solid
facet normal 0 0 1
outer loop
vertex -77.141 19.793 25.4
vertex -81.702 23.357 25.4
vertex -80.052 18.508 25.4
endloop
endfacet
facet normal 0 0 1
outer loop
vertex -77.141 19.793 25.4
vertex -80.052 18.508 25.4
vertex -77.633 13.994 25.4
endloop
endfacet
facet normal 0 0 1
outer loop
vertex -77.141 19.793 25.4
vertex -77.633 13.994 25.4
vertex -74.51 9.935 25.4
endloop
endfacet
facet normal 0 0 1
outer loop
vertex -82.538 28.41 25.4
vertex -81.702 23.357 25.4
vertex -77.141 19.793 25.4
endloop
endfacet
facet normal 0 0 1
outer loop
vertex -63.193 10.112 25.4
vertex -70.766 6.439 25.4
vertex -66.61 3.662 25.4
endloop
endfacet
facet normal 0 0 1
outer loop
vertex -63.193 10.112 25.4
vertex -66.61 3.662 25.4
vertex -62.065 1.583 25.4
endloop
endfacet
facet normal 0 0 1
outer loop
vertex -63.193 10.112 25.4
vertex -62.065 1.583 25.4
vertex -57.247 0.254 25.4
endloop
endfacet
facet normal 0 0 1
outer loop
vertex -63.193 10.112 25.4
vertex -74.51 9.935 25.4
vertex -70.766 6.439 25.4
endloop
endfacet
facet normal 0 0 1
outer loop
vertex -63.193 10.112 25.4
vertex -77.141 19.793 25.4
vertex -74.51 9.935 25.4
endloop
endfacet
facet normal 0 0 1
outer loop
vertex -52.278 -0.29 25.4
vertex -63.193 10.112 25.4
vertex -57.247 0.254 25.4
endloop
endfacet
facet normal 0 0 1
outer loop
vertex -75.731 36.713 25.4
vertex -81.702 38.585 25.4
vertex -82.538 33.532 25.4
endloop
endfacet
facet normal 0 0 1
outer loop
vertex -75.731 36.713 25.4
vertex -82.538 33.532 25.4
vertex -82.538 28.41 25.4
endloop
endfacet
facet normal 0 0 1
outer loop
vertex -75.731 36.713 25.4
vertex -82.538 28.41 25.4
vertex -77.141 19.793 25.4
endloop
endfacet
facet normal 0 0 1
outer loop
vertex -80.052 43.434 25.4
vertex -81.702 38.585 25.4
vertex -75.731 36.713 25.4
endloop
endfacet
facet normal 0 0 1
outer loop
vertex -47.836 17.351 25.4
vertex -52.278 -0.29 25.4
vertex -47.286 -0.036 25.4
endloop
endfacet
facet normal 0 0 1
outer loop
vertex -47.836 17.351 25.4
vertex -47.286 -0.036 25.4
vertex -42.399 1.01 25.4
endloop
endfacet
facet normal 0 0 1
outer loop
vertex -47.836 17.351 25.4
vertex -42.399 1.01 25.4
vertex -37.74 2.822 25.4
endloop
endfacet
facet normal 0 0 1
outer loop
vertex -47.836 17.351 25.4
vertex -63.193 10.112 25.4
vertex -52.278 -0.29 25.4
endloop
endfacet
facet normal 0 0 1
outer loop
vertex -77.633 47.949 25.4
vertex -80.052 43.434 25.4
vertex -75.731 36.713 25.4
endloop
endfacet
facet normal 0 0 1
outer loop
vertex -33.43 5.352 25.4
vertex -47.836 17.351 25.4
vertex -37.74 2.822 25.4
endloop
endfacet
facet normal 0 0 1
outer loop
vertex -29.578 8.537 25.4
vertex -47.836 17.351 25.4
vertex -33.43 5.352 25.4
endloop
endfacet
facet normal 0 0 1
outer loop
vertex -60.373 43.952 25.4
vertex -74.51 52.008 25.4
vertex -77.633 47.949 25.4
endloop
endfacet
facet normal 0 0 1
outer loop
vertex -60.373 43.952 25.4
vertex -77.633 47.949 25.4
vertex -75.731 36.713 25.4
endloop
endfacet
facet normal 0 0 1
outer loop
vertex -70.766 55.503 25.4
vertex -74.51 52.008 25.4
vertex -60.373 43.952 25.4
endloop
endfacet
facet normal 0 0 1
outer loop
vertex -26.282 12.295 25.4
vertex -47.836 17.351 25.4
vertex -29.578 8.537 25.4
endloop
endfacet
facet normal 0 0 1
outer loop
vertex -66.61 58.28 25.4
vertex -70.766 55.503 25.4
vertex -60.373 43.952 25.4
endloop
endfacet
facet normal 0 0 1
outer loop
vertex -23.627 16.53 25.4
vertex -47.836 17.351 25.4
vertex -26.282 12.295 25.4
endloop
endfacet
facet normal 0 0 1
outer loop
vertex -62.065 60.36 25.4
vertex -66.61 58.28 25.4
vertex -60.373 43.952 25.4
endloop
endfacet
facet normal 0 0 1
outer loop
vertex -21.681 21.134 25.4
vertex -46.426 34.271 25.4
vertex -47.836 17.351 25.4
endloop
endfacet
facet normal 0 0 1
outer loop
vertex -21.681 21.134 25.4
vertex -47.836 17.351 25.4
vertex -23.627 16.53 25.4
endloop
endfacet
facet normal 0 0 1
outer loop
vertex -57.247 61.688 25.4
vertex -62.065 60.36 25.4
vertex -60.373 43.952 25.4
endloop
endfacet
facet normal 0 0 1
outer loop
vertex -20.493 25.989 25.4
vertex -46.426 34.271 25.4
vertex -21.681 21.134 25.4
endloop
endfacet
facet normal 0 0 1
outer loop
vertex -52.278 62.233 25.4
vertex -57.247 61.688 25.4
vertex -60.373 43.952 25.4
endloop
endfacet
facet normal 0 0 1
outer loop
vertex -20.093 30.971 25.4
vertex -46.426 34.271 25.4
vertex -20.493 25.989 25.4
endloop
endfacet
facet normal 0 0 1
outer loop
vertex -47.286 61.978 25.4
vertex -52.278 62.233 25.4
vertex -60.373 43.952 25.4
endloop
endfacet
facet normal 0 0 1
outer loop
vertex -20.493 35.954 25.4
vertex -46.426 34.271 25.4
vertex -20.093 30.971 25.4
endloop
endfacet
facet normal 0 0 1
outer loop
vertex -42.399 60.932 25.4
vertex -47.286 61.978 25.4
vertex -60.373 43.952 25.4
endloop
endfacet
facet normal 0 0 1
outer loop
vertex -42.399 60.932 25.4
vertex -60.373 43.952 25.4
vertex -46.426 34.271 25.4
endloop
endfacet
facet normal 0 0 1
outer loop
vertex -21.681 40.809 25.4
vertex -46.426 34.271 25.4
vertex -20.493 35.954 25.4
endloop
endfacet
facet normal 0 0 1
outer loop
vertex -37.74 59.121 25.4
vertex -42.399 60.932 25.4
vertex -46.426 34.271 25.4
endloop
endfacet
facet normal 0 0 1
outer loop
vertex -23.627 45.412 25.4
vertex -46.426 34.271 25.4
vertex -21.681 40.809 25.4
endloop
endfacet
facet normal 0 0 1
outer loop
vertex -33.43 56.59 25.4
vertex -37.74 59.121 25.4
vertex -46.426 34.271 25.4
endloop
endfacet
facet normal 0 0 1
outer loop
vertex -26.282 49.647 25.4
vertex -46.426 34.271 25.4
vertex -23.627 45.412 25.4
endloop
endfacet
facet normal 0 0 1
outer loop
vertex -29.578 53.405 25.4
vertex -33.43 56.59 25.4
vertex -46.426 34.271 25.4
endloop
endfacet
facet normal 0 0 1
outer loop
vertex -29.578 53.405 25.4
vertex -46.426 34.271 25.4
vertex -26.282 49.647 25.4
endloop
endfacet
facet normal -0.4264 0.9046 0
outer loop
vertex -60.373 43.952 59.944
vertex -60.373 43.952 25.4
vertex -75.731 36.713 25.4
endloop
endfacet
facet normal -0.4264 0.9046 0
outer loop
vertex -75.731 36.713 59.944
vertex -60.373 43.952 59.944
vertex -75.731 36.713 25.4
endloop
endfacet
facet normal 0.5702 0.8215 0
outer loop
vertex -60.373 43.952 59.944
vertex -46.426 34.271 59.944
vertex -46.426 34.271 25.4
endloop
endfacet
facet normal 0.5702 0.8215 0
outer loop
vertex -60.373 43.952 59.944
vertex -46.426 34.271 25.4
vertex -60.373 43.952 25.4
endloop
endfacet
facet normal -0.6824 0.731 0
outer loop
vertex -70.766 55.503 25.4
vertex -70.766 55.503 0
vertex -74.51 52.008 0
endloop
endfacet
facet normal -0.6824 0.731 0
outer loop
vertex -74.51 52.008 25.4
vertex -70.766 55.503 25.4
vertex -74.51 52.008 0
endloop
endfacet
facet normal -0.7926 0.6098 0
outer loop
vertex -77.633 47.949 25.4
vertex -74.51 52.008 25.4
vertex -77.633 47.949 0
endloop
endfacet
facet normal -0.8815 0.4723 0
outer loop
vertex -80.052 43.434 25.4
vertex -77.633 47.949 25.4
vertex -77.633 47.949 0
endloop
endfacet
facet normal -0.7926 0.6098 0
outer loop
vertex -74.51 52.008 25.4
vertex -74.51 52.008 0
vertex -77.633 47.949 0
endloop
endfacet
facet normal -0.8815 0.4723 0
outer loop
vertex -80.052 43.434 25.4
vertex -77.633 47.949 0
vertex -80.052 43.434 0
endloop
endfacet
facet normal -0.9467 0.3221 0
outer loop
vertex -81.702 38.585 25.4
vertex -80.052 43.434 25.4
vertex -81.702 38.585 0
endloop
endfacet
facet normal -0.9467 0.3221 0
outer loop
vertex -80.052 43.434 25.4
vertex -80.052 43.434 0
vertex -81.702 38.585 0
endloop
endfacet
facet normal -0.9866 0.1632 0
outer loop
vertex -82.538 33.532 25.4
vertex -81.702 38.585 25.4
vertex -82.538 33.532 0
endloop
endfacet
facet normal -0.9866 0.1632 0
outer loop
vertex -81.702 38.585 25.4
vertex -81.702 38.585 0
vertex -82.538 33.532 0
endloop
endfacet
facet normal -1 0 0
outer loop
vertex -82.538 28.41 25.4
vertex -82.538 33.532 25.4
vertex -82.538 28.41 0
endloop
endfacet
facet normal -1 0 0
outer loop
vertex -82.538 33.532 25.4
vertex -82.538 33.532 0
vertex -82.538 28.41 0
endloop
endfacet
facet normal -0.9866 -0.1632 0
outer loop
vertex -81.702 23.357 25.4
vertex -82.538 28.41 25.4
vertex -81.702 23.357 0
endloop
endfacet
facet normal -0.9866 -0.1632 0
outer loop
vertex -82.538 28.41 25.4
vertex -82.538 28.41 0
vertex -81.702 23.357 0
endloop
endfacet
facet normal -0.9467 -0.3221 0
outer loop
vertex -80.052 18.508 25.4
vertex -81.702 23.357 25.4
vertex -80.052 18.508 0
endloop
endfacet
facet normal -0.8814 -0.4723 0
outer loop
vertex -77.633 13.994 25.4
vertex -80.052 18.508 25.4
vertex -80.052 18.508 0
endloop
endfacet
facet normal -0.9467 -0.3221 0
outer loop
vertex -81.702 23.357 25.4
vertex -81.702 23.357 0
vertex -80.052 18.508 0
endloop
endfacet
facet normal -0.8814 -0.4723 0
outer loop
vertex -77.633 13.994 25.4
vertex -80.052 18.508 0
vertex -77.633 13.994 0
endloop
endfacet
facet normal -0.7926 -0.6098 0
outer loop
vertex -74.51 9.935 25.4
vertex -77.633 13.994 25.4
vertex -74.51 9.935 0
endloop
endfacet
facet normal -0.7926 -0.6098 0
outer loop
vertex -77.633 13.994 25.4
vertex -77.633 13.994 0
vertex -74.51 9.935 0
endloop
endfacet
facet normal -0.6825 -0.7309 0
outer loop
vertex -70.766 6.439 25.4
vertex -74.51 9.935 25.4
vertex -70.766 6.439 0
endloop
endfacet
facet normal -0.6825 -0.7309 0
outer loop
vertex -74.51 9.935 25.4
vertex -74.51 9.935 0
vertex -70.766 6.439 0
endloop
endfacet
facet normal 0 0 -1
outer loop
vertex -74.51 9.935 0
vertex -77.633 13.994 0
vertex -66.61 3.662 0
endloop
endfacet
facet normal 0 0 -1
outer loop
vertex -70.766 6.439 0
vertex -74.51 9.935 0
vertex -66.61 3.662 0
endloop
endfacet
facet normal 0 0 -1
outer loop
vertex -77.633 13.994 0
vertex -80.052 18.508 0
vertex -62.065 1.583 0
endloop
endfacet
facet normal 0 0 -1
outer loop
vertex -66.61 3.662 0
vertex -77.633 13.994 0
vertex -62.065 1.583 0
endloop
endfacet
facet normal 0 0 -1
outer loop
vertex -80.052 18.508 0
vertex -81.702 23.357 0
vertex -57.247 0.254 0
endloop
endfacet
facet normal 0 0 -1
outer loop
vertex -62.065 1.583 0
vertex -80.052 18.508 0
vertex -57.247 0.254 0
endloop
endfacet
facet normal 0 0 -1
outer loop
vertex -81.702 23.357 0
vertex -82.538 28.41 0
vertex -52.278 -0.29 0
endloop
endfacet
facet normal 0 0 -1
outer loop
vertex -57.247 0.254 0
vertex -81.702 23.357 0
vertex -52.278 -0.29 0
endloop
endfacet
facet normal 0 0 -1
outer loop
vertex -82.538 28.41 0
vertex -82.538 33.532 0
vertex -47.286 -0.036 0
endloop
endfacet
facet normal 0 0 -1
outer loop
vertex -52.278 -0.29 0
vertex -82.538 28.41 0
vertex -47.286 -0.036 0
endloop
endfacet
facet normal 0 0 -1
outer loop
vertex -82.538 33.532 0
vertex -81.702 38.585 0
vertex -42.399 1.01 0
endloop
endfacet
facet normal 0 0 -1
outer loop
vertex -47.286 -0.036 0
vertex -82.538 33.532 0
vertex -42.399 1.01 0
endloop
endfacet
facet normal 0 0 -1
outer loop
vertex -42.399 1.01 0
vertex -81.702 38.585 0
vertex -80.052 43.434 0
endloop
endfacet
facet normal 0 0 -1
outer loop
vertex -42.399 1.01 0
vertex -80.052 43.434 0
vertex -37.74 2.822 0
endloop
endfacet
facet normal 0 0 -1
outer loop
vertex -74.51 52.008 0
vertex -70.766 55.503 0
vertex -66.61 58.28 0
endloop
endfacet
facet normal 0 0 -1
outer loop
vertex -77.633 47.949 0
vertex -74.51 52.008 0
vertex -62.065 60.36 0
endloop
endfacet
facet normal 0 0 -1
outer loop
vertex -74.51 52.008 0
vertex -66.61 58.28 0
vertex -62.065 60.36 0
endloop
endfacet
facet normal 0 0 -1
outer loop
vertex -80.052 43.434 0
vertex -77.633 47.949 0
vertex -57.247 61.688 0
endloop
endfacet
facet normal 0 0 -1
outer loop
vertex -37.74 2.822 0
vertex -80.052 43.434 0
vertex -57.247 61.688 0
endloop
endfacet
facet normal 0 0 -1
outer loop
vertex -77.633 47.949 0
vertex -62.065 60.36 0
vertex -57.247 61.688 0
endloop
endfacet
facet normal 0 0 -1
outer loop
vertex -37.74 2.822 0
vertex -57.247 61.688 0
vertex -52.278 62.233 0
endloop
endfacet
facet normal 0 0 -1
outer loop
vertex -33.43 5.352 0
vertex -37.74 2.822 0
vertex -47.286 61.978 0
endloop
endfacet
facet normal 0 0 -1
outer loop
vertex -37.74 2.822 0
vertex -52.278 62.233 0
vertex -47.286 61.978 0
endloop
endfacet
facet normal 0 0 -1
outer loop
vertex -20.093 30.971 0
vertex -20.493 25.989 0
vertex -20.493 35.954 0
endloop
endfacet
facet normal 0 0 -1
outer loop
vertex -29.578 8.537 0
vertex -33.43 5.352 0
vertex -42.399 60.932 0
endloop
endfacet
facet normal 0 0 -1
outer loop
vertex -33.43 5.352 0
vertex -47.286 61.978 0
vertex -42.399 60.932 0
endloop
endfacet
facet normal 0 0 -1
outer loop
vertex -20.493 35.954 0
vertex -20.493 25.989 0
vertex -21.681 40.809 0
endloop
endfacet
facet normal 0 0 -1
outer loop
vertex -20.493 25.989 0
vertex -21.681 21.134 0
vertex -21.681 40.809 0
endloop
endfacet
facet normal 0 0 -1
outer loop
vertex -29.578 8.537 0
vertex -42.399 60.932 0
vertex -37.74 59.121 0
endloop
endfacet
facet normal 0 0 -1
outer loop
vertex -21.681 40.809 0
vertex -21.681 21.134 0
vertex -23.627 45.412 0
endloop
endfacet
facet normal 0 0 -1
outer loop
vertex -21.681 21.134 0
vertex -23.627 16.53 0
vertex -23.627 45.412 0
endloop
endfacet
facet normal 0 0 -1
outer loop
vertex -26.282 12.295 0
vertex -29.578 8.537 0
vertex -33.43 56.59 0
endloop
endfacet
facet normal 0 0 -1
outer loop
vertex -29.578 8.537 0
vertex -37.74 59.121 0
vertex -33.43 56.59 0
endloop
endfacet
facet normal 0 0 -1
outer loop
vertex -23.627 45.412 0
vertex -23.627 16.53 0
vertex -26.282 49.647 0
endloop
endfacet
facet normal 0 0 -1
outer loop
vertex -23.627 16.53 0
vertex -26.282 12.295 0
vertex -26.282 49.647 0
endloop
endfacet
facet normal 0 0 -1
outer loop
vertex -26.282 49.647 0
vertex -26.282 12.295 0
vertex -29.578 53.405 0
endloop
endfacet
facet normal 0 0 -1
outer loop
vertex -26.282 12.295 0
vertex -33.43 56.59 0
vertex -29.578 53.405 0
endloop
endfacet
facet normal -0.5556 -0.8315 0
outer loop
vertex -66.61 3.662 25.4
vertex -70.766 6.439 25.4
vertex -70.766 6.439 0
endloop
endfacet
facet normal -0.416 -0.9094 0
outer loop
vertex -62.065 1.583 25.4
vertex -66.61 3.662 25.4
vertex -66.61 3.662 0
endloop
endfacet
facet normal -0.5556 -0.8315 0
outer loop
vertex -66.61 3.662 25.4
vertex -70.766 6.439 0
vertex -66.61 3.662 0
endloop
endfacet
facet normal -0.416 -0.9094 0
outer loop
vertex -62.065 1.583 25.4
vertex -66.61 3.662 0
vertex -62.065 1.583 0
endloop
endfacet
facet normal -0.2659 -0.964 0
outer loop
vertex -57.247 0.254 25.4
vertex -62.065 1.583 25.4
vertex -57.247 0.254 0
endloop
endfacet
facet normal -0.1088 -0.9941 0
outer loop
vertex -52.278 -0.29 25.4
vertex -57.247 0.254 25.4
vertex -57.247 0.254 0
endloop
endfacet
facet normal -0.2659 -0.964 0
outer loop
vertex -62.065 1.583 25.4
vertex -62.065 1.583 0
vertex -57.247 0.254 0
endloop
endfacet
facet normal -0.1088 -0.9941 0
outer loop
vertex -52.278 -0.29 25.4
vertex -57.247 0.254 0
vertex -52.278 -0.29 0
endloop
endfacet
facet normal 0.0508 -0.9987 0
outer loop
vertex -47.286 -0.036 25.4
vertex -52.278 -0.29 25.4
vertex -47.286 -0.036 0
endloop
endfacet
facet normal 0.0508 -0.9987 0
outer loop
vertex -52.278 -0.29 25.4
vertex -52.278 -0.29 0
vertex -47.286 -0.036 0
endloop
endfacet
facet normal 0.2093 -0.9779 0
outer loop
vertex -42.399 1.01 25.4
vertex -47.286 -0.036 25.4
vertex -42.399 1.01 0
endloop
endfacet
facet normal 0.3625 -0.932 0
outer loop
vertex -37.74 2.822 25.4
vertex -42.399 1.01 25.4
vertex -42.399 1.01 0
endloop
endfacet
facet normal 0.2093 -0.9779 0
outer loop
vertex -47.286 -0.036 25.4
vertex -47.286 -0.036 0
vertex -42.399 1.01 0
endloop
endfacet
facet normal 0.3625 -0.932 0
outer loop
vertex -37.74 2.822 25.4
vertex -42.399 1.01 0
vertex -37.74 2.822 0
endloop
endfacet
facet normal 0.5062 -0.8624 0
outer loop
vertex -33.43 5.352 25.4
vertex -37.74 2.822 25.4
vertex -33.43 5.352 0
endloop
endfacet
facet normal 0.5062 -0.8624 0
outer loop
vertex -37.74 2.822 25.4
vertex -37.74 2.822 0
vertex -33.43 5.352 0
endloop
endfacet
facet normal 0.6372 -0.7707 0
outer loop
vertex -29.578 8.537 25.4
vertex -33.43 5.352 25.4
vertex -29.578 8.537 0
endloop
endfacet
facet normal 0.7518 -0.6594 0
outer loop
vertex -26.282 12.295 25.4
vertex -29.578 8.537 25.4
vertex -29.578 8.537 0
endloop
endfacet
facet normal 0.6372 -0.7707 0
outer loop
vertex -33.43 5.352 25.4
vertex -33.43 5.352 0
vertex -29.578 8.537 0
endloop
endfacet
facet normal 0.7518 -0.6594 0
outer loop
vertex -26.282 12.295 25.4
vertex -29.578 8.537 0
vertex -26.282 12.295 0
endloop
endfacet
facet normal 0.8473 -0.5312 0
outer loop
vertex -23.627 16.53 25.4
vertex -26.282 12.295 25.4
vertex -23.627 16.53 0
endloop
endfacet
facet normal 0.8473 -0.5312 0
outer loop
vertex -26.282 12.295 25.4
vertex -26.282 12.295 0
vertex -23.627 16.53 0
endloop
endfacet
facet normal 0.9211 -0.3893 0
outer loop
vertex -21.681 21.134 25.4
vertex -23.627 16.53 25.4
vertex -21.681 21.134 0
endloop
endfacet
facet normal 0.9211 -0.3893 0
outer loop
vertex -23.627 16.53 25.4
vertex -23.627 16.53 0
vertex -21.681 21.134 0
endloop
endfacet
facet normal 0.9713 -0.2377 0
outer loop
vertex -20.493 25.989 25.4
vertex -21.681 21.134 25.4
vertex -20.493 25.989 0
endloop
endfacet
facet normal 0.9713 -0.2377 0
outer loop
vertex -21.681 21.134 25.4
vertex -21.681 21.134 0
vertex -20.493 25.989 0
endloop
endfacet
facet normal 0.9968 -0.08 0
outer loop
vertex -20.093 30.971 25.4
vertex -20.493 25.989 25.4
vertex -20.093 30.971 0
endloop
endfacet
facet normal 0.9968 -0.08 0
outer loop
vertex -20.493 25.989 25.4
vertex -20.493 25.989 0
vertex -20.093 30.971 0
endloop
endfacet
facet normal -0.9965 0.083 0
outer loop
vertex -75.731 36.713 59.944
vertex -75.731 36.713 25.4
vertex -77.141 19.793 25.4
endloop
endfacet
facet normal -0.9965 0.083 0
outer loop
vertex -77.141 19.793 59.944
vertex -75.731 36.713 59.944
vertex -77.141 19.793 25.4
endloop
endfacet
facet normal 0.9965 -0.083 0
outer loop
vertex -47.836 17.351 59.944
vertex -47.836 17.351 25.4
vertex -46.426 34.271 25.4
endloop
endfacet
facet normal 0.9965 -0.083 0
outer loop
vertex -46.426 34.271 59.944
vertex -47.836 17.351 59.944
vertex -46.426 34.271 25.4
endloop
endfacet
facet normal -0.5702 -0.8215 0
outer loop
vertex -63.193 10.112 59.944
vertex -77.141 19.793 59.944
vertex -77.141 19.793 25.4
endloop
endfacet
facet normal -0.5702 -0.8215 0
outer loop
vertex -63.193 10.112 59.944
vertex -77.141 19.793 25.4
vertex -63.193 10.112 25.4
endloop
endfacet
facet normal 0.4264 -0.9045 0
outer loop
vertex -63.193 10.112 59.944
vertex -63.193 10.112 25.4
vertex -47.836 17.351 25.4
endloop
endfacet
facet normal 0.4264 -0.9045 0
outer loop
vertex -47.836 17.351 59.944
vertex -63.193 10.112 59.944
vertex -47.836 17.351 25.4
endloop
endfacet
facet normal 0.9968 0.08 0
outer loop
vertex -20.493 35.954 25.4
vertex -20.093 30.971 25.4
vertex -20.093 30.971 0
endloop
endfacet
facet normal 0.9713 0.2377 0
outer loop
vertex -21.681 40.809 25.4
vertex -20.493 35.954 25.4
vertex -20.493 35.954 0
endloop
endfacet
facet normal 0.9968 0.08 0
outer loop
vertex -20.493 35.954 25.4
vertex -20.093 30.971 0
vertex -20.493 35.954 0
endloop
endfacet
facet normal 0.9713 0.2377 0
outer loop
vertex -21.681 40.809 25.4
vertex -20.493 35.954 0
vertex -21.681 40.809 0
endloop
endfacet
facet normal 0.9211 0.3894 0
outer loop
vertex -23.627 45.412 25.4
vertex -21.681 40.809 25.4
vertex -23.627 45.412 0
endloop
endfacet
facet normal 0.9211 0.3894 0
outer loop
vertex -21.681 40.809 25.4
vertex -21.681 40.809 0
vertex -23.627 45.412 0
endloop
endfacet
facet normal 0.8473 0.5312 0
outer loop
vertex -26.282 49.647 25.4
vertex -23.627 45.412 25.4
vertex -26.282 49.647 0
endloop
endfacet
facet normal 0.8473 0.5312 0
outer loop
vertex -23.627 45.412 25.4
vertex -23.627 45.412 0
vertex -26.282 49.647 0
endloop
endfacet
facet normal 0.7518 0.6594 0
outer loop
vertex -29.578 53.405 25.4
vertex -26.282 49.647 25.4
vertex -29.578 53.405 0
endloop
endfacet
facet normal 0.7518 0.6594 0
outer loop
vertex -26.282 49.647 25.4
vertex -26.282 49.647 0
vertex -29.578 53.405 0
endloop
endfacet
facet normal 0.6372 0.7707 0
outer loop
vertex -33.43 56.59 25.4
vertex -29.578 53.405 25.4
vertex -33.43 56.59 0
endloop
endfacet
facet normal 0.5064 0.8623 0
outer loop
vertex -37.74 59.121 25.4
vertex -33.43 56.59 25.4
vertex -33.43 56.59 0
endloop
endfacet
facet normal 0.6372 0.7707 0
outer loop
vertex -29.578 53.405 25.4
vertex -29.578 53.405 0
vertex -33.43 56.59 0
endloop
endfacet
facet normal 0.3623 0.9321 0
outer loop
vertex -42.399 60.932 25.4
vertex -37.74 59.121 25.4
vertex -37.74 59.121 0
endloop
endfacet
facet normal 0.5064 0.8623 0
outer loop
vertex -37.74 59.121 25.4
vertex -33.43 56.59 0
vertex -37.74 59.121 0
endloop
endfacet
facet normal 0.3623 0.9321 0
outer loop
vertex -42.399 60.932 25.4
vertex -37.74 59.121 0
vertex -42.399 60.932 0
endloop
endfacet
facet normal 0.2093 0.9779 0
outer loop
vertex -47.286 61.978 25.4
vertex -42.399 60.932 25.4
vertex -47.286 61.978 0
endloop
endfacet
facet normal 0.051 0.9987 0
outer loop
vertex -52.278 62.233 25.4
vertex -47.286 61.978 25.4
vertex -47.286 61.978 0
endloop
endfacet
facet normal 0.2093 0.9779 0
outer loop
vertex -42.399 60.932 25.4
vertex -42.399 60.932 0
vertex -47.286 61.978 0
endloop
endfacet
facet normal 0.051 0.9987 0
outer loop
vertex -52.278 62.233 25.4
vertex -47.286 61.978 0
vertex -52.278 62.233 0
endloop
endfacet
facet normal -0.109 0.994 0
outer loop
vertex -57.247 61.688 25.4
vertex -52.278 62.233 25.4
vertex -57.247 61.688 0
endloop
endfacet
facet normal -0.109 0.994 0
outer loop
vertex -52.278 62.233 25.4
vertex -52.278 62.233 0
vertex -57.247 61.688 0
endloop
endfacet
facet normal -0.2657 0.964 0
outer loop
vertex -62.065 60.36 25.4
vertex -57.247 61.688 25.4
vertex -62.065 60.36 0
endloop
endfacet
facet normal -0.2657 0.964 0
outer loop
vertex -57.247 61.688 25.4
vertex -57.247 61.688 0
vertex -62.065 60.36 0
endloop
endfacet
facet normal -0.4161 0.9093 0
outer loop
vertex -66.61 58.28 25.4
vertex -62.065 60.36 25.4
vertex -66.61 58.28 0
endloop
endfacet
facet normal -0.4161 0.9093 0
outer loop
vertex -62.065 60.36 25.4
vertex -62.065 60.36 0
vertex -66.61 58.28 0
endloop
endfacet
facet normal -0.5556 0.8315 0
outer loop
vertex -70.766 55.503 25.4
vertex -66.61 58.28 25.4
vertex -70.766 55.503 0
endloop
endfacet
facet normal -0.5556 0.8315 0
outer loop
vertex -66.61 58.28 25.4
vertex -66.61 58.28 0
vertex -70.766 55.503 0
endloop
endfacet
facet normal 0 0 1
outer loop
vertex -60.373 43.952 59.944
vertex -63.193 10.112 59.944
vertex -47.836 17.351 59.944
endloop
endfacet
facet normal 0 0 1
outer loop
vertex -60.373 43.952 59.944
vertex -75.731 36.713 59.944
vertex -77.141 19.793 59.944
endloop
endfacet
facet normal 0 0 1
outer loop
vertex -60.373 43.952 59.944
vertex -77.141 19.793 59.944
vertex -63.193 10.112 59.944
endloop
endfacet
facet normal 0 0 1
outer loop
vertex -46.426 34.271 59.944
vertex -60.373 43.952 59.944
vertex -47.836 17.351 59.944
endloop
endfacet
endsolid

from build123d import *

# Parameters (mm, degrees)
F1_DEPTH = 25.4
F3_DEPTH = 34.544


with BuildPart() as f1:
    # F0 (on Top) → F1 (new body)
    with BuildSketch(Plane.XY):
        with BuildLine():
            Line((-70.7662329078, 55.5032007331), (-70.7662329078, 6.4394138818))
            ThreePointArc((-70.7662329078, 6.4394138818), (-37.7403006525, 2.8219468482), (-20.0934376224, 30.9713073075))
            ThreePointArc((-20.0934376224, 30.9713073075), (-37.7403006525, 59.1206677668), (-70.7662329078, 55.5032007331))
        make_face()
        with BuildLine():
            ThreePointArc((-70.7662329078, 55.5032007331), (-82.6427001849, 30.9713073075), (-70.7662329078, 6.4394138818))
            Line((-70.7662329078, 6.4394138818), (-70.7662329078, 55.5032007331))
        make_face()
    extrude(amount=F1_DEPTH)

    # F2 (on face) → F3 (join)
    with BuildSketch(Plane.XY.offset(25.4)):
        Polygon((-63.1933323456, 10.1122700805), (-47.8355326341, 17.3510151719), (-46.425569919, 34.2706324141), (-60.3734069155, 43.9515045648), (-75.7312066271, 36.7127594734), (-77.1411693421, 19.7931422312), align=None)
    extrude(amount=F3_DEPTH)


solid = f1.part
